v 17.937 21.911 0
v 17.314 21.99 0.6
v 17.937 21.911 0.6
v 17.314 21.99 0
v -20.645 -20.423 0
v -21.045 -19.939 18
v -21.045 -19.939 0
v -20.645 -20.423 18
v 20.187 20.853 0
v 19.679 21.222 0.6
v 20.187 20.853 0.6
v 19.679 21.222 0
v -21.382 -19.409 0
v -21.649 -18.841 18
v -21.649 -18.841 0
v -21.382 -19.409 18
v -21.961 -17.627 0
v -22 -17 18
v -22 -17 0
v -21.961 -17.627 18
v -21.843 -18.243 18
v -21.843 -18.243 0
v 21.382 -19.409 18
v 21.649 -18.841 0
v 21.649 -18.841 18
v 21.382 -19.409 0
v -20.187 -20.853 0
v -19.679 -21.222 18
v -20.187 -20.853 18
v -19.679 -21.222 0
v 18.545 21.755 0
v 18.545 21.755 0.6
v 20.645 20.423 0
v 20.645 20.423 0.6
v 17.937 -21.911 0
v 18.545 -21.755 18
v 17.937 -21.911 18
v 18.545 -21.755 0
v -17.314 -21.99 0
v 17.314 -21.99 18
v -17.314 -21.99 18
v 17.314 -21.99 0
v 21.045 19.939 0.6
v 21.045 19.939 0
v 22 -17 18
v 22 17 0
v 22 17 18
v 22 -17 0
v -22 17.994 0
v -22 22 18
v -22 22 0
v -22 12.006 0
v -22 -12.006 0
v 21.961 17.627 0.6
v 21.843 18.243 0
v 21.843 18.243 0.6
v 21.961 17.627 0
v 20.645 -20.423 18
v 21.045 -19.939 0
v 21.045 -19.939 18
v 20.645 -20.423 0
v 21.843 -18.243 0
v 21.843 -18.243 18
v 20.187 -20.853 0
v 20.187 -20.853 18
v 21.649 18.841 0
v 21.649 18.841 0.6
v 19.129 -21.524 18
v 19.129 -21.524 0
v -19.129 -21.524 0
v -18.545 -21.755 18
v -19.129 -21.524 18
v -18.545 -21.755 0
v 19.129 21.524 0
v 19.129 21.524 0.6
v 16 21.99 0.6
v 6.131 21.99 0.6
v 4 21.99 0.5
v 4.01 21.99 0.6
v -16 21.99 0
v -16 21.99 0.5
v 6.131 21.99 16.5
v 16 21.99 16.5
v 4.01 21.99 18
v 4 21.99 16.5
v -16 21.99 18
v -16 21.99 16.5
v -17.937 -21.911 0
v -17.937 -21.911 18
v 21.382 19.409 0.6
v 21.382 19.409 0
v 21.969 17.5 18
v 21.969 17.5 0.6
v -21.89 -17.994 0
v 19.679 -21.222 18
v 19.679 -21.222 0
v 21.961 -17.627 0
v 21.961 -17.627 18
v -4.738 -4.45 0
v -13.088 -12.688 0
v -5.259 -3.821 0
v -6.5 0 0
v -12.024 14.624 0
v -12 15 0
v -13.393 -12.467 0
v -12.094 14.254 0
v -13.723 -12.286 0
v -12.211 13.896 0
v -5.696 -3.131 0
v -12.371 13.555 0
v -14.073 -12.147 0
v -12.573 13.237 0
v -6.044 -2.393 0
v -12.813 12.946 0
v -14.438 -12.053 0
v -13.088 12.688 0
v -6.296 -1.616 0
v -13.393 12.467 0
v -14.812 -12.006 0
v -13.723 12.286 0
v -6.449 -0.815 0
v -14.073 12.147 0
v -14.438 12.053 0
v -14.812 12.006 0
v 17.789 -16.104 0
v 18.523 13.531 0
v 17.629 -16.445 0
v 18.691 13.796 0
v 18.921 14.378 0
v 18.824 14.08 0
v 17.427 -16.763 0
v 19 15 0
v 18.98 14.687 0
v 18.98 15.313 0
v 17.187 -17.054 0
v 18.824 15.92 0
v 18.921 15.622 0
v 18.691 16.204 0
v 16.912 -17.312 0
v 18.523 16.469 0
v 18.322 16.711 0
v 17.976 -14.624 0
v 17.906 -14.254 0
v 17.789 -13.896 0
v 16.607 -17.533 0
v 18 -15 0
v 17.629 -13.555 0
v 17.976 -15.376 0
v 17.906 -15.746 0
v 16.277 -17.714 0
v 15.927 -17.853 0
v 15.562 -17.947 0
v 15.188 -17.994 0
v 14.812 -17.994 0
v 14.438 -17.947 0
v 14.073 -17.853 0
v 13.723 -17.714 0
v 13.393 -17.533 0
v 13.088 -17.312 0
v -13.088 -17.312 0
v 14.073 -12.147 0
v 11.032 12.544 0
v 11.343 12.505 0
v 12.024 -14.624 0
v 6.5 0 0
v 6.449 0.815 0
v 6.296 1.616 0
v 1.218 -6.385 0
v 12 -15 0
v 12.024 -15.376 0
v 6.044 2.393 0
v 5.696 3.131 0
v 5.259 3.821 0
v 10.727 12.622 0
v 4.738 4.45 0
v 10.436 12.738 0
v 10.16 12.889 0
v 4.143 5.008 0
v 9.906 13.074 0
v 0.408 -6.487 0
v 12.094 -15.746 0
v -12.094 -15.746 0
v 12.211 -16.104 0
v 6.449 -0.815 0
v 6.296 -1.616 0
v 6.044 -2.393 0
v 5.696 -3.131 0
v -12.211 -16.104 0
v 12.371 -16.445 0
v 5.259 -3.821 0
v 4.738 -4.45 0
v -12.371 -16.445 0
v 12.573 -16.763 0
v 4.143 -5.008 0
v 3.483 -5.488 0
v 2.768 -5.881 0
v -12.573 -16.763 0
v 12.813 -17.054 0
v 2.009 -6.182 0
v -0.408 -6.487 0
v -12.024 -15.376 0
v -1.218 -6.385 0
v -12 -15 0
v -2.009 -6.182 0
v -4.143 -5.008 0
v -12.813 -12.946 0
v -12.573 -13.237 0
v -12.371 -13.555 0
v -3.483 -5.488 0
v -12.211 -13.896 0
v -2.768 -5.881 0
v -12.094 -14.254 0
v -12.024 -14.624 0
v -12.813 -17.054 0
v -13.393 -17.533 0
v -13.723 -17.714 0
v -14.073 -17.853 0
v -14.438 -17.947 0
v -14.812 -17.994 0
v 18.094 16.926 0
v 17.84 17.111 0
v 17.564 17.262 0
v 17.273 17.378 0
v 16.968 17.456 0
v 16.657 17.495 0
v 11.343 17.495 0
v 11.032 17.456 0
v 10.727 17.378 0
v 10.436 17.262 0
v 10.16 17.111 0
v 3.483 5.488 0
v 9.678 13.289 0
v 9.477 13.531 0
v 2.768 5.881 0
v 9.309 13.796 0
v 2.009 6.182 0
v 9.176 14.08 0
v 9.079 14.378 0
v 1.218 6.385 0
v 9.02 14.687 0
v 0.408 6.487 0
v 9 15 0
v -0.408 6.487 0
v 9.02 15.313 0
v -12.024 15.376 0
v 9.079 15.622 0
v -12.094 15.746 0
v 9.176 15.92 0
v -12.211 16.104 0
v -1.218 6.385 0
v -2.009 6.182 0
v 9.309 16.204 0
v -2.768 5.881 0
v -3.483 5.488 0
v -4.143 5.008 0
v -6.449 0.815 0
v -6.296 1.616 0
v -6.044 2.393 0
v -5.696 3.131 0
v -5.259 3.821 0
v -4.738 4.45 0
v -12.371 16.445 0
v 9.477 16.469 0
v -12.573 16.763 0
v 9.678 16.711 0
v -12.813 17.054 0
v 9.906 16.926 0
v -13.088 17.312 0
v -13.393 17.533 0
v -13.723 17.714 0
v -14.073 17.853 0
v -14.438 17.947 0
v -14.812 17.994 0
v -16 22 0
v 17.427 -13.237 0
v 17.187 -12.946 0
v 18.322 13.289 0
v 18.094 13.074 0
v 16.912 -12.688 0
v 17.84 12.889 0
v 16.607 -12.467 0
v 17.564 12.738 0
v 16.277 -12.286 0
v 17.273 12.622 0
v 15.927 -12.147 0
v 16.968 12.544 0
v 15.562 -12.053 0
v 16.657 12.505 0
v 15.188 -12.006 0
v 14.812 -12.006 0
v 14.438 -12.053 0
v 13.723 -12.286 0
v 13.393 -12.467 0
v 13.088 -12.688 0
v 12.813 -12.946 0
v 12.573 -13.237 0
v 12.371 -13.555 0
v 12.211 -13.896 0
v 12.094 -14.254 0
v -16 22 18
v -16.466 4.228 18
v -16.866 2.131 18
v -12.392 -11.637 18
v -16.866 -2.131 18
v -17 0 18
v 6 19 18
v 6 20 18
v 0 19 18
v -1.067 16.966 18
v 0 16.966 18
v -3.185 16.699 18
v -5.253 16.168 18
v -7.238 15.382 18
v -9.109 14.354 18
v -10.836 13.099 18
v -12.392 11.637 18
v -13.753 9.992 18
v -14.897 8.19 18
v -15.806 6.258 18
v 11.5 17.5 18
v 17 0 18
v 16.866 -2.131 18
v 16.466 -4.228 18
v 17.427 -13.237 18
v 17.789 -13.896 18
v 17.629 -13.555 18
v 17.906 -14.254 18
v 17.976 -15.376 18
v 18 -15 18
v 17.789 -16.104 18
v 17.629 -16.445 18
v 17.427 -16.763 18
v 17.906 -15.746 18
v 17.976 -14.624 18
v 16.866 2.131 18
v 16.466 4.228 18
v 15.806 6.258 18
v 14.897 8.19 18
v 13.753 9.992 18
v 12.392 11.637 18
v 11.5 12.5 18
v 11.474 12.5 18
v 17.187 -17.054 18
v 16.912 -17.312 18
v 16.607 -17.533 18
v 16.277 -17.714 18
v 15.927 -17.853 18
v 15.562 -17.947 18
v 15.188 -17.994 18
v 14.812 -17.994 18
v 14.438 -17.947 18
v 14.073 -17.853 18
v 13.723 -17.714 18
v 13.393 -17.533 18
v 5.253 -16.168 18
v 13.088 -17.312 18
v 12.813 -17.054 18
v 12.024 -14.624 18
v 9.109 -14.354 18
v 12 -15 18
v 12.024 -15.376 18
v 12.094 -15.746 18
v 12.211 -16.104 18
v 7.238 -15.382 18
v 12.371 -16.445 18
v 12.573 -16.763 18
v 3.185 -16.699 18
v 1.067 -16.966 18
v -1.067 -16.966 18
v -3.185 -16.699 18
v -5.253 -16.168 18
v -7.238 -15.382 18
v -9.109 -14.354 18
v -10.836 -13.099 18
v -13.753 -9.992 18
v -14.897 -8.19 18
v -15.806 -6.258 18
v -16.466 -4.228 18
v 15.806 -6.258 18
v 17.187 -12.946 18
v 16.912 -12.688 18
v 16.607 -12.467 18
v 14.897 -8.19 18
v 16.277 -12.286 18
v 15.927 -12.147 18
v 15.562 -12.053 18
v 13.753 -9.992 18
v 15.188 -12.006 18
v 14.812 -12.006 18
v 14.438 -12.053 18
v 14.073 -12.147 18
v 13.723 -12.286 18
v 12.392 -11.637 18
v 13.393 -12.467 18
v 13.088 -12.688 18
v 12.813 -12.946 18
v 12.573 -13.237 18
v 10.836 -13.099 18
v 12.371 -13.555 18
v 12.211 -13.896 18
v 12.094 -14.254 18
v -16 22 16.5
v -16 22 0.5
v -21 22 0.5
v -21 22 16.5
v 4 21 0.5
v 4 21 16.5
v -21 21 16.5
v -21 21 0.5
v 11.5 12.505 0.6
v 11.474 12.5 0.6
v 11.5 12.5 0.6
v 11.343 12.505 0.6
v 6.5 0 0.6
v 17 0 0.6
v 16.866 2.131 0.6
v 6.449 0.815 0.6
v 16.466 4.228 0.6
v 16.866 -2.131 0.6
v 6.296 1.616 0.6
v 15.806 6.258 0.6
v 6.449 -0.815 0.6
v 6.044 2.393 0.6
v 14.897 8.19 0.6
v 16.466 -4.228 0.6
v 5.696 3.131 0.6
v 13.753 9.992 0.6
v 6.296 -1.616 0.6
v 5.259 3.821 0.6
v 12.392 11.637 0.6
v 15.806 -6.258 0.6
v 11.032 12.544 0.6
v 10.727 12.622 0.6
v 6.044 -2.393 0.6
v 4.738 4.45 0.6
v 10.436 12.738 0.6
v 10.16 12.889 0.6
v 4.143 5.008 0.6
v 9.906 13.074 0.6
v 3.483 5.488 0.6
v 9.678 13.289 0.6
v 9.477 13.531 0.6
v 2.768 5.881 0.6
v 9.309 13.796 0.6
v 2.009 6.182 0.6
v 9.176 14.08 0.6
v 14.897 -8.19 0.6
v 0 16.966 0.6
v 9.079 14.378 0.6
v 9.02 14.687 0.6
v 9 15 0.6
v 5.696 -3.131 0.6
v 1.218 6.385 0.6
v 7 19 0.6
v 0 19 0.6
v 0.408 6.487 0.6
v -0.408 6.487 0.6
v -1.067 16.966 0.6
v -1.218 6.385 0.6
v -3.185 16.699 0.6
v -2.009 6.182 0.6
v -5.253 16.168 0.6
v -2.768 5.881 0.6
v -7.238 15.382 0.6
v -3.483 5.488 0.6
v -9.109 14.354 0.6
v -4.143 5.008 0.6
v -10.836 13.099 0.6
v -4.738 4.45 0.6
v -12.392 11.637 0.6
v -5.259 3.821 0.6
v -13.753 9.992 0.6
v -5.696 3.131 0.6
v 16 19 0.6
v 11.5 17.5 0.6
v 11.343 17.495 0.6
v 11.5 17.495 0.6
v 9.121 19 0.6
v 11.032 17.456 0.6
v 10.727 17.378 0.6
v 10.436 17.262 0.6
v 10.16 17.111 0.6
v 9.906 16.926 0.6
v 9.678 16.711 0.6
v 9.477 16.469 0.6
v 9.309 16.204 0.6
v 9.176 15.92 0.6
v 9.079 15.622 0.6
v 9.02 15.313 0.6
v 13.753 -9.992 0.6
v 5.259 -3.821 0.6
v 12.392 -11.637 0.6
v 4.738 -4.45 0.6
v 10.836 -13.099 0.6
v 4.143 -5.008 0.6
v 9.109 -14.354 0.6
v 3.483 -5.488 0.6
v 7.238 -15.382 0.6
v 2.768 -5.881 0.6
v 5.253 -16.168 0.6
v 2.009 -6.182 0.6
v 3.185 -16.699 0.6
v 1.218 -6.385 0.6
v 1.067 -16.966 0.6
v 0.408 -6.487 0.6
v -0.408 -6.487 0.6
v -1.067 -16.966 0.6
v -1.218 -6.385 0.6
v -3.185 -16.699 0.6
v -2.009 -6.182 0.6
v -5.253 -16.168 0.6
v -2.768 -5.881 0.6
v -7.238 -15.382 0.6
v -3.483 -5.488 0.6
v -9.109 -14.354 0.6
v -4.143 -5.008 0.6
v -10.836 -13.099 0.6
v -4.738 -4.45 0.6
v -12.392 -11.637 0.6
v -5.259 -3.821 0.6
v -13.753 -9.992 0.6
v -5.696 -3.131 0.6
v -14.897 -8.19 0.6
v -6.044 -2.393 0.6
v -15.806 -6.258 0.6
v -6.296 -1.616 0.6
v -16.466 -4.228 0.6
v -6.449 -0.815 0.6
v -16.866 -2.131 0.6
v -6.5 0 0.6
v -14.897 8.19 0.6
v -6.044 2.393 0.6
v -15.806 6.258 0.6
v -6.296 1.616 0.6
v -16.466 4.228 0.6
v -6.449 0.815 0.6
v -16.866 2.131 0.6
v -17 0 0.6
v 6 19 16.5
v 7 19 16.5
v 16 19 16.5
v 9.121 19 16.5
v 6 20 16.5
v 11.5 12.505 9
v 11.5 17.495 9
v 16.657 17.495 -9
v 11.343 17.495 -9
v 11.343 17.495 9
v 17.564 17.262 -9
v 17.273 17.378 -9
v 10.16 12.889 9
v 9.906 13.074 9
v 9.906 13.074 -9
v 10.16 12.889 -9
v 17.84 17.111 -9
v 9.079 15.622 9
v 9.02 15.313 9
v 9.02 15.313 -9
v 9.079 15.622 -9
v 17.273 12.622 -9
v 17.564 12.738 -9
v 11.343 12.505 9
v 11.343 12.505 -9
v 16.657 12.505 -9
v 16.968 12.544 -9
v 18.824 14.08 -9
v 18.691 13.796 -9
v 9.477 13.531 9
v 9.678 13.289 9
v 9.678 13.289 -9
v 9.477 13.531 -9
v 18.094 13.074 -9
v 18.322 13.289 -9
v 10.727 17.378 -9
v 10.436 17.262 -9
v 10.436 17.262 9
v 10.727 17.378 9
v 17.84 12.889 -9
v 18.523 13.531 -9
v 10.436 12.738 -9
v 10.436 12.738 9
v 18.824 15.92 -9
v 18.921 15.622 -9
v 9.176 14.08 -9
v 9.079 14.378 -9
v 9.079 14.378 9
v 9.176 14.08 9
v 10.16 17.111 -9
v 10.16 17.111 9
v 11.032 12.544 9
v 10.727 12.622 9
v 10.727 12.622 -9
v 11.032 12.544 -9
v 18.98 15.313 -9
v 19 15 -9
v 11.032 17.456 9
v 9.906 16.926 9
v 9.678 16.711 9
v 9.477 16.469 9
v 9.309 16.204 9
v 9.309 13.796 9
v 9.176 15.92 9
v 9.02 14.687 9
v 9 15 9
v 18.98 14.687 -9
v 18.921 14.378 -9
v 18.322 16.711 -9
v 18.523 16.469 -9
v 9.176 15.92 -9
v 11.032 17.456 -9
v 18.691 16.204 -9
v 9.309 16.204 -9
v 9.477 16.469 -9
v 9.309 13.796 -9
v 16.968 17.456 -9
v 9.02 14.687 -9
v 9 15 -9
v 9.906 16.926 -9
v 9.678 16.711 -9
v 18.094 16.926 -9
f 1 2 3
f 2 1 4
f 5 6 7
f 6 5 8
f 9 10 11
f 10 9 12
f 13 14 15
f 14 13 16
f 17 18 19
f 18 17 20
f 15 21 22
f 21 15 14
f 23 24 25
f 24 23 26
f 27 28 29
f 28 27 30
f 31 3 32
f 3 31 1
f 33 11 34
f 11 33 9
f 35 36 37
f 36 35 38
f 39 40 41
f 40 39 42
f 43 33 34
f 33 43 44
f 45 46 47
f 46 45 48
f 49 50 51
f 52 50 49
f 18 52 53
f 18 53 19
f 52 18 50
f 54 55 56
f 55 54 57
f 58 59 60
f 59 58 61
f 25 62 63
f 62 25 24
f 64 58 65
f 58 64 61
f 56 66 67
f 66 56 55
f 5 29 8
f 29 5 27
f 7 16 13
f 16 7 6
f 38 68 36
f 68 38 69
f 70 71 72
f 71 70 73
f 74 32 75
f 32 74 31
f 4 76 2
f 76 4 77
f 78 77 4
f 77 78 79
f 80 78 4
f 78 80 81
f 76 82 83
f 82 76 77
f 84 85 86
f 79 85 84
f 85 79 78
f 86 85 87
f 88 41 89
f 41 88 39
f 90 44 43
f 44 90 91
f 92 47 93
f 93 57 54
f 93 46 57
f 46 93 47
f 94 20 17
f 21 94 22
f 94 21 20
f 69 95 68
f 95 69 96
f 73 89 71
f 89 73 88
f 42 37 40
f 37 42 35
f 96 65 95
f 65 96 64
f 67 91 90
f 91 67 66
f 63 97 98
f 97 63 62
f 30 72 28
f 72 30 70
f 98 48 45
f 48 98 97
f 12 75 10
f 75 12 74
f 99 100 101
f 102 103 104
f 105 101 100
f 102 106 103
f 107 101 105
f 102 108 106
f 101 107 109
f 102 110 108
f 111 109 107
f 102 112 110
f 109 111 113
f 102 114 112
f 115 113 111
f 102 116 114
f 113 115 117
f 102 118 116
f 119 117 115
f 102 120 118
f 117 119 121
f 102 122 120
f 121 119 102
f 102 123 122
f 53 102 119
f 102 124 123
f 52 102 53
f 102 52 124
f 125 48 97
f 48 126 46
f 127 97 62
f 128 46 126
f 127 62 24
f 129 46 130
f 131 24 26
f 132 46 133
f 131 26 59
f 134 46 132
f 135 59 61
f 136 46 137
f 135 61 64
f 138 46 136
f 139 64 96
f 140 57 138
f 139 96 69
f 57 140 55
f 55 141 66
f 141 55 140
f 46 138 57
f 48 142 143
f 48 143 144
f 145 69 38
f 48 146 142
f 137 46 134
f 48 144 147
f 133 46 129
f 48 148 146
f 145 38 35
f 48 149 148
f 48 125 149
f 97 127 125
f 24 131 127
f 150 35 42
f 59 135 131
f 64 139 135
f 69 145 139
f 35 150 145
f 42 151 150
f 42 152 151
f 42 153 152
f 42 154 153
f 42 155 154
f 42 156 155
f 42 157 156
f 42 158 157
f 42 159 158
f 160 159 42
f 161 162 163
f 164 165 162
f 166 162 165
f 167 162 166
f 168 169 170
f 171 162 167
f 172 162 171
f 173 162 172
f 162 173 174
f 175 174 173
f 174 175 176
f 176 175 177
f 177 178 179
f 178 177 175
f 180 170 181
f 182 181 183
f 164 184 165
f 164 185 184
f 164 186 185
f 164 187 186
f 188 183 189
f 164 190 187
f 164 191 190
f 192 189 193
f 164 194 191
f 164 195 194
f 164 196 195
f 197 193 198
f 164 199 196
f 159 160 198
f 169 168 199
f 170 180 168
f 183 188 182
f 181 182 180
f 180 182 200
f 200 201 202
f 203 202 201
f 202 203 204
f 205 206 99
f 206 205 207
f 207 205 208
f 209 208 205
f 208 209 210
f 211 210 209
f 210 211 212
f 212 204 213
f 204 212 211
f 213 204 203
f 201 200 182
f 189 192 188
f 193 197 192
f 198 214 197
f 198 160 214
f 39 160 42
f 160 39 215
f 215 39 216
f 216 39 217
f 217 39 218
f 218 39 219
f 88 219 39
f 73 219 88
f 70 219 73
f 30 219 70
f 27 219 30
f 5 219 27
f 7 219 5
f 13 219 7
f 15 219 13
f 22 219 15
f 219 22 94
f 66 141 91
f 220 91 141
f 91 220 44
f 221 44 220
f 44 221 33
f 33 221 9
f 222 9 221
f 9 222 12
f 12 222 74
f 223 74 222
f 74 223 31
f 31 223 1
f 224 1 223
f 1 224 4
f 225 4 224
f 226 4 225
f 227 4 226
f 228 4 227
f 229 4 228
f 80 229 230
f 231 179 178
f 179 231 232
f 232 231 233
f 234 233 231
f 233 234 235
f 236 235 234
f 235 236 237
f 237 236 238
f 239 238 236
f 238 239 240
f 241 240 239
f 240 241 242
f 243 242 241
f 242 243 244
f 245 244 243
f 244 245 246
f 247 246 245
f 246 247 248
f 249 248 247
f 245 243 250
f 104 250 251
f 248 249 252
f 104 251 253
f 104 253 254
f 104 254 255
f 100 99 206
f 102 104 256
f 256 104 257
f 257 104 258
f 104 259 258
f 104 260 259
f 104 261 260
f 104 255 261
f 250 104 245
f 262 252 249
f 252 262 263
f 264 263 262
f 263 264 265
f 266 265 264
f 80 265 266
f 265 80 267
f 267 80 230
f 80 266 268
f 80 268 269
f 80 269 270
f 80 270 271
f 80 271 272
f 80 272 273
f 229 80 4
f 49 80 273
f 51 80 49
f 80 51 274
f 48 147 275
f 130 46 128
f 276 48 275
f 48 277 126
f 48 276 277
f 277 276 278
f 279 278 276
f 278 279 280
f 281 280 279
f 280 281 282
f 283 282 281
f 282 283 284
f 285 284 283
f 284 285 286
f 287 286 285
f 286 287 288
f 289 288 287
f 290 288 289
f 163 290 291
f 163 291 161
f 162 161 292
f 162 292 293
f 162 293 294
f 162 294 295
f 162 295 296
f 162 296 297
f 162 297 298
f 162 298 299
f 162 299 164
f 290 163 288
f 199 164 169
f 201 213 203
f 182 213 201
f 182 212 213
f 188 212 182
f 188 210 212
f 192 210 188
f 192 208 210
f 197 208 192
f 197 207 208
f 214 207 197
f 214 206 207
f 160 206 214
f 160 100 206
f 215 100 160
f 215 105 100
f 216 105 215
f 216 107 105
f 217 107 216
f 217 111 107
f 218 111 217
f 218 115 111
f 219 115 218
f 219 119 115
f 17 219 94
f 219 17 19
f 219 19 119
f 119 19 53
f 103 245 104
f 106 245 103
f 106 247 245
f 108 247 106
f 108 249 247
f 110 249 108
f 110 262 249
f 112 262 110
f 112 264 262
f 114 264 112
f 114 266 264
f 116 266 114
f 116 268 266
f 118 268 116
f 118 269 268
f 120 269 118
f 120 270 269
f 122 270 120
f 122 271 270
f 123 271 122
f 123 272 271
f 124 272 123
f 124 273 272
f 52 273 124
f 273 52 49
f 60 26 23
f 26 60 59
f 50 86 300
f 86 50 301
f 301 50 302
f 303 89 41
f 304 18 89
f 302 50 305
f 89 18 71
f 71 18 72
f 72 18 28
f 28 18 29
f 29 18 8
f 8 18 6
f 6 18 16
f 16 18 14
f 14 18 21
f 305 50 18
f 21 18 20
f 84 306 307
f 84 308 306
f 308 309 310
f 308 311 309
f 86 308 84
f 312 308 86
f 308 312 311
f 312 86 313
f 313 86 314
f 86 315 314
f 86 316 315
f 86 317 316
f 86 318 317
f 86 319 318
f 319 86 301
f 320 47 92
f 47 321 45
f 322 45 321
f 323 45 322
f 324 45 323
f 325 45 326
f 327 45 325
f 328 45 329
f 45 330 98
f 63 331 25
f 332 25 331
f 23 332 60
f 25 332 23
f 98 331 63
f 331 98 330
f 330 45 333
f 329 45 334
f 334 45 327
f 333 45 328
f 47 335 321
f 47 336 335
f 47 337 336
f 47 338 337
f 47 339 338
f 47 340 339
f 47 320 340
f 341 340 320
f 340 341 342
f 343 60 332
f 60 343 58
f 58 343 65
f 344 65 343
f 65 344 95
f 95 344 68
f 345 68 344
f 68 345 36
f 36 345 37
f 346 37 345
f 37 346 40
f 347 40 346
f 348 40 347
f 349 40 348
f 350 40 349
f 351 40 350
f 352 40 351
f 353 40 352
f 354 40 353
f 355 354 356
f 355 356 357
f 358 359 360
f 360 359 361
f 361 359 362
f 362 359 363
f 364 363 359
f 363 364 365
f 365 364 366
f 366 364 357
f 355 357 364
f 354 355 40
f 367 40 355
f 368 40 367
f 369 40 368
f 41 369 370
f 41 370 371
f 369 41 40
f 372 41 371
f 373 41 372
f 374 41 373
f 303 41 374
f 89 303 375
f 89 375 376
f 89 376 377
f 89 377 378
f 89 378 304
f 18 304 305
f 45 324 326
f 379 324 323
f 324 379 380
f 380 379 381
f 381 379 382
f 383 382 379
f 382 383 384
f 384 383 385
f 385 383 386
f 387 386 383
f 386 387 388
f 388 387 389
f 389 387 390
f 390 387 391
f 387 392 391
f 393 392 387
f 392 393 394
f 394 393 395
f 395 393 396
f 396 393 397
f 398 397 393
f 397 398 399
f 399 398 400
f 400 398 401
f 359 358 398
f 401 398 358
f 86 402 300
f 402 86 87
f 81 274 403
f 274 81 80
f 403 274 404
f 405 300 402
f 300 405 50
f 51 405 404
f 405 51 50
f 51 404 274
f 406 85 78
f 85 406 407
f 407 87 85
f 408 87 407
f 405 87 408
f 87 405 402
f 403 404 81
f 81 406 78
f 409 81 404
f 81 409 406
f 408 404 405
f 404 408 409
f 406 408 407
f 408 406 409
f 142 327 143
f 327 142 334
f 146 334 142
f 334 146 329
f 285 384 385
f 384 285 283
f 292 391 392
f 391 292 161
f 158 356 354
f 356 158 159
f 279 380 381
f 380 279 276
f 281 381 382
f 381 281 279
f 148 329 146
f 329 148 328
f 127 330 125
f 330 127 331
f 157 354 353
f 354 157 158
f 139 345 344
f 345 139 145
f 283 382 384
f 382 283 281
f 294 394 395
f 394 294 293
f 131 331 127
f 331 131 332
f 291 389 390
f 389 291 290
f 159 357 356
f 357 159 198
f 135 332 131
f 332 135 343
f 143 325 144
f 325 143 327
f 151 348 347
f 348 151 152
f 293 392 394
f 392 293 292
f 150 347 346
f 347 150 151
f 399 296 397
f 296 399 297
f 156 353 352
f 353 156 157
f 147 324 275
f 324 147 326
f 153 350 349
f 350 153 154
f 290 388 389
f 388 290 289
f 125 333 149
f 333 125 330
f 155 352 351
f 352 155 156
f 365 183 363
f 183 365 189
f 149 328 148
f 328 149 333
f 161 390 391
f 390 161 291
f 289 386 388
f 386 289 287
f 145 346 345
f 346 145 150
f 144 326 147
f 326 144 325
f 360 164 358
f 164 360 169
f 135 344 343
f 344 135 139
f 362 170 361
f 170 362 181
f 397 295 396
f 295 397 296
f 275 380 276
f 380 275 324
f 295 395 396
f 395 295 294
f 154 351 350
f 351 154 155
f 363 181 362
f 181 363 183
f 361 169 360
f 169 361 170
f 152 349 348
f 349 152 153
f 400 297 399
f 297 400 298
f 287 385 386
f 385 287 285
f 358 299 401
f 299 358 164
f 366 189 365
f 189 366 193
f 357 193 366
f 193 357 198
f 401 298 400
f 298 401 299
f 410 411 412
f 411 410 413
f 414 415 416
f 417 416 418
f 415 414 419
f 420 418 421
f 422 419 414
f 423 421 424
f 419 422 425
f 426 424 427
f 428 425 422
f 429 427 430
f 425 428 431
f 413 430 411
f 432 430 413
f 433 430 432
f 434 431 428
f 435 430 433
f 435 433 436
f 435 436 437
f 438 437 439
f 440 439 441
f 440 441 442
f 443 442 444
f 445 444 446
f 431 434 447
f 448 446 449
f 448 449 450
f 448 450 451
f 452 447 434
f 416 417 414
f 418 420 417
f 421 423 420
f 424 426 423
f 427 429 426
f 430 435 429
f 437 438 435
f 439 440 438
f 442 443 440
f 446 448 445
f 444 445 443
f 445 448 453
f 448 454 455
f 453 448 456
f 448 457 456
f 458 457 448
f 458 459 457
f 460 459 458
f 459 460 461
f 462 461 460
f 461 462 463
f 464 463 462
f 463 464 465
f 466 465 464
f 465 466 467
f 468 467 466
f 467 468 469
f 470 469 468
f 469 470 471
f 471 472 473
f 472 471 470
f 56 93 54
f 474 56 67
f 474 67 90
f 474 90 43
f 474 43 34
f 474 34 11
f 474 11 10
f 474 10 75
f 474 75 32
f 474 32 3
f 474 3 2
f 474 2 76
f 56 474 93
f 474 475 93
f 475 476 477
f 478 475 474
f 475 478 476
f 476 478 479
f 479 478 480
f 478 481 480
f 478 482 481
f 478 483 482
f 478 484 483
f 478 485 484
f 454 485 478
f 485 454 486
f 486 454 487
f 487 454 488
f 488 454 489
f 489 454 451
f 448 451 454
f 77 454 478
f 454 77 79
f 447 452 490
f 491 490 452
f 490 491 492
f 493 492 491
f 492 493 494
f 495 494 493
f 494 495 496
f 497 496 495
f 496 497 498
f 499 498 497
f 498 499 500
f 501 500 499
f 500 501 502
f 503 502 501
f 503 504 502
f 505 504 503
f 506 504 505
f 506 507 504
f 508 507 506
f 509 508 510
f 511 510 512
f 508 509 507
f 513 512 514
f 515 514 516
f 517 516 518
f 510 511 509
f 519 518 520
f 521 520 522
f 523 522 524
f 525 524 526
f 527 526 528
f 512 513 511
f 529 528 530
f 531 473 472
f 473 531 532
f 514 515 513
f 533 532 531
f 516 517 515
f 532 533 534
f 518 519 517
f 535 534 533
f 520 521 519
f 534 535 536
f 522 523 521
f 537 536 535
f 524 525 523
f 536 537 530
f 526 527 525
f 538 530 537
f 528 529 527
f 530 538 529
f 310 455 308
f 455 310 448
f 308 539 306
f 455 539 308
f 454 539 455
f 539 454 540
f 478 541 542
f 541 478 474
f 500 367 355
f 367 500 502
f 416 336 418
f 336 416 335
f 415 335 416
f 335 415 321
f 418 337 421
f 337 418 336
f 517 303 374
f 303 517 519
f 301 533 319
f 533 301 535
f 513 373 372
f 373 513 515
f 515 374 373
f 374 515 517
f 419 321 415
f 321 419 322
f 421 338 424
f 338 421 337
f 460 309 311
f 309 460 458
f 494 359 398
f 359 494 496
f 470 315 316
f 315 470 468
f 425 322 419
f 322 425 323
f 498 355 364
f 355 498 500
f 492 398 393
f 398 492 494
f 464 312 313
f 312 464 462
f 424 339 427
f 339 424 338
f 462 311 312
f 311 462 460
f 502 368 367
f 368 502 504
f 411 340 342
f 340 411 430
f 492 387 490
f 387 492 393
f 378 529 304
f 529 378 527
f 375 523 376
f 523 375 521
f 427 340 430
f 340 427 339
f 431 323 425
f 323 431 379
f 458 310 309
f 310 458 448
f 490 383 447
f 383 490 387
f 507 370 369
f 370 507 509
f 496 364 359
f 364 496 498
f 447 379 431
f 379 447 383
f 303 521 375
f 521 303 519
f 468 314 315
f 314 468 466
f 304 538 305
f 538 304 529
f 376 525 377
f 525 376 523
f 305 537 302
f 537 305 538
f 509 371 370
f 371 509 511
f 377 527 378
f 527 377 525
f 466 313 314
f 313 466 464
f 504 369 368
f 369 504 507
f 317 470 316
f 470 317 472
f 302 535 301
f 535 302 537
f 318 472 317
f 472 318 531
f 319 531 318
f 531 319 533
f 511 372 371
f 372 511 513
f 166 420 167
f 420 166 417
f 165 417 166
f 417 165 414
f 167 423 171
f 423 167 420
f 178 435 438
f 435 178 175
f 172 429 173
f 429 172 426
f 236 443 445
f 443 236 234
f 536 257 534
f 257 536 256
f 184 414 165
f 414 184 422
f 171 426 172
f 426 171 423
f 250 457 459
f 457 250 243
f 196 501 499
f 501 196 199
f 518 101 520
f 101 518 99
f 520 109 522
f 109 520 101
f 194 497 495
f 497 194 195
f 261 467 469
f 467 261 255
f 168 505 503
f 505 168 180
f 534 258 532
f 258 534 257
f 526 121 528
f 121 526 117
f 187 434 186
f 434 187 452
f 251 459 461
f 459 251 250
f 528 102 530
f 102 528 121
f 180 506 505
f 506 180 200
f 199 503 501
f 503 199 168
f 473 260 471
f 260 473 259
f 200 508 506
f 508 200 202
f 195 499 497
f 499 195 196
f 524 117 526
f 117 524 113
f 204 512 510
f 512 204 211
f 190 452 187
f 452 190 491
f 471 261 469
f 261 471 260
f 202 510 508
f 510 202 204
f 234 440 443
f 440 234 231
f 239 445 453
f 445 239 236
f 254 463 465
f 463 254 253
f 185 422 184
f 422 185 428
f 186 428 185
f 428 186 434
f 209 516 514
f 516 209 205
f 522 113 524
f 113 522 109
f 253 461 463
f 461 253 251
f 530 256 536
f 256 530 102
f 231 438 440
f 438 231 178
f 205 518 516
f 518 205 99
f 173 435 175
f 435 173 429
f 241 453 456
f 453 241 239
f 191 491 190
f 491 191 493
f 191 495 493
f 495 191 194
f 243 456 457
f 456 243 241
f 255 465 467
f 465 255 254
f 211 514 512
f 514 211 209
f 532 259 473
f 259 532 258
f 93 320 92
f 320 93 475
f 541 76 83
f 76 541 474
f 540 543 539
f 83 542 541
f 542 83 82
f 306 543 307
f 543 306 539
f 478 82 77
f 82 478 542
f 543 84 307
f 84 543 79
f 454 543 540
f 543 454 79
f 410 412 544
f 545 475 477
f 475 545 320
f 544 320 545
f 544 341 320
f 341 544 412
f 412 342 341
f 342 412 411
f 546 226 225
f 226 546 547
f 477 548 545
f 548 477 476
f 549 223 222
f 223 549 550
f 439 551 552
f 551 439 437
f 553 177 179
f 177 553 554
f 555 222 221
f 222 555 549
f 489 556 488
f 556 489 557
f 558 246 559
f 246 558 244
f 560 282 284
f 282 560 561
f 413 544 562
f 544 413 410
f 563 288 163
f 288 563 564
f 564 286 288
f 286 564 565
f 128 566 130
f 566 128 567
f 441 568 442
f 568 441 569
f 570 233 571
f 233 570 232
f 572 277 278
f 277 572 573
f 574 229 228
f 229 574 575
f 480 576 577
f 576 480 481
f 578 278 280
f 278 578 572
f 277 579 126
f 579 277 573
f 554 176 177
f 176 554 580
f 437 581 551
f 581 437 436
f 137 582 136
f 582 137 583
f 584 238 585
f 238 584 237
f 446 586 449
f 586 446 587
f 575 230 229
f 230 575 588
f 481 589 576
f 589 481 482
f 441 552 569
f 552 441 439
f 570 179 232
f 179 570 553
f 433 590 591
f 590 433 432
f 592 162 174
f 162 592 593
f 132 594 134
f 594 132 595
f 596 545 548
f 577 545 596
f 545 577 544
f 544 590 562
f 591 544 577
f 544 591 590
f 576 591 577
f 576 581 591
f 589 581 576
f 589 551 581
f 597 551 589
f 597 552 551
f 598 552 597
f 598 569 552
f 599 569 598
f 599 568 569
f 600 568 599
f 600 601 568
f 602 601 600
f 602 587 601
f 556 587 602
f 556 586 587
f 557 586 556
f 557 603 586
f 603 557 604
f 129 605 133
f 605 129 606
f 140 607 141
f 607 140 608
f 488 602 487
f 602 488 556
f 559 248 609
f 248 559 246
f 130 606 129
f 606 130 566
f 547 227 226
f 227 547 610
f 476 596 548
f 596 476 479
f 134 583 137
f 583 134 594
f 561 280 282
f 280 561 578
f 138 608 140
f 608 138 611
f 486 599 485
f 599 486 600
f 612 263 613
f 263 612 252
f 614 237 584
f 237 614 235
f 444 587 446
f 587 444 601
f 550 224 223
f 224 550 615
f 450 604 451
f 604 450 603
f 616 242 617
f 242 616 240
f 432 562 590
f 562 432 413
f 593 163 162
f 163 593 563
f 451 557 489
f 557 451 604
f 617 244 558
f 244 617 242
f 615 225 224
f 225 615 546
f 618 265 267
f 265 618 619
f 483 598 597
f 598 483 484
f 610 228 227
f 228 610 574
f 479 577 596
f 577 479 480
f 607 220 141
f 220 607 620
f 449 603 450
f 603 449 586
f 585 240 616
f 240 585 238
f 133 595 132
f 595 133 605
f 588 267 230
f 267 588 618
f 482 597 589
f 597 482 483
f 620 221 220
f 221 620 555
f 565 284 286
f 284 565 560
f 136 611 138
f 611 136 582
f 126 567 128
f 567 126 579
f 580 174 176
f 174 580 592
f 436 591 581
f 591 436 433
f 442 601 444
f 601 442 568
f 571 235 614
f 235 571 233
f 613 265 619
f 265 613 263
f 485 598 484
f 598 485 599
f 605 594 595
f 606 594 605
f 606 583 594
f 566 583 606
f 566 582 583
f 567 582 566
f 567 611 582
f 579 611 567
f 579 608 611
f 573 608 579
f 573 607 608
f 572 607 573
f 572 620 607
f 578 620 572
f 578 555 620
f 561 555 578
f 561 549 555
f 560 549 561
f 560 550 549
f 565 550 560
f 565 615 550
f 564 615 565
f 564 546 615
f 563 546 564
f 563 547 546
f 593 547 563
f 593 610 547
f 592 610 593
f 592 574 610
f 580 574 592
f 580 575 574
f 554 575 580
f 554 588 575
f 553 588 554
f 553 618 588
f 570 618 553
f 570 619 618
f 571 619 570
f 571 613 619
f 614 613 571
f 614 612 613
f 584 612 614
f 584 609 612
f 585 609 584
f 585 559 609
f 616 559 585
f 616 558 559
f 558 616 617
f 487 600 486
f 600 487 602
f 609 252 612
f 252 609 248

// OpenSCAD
$fn = 50;


union() {
	difference() {
		union() {
			hull() {
				translate(v = [-17.0000000000, 17.0000000000, 0]) {
					cylinder(h = 18, r = 5);
				}
				translate(v = [17.0000000000, 17.0000000000, 0]) {
					cylinder(h = 18, r = 5);
				}
				translate(v = [-17.0000000000, -17.0000000000, 0]) {
					cylinder(h = 18, r = 5);
				}
				translate(v = [17.0000000000, -17.0000000000, 0]) {
					cylinder(h = 18, r = 5);
				}
			}
			translate(v = [-22.0000000000, 16.0000000000, 0]) {
				cube(size = [6, 6, 18]);
			}
		}
		union() {
			translate(v = [-22.5000000000, -15.0000000000, -250.0000000000]) {
				rotate(a = [0, 0, 0]) {
					difference() {
						union() {
							hull() {
								translate(v = [7.5000000000, 0, 0]) {
									cylinder(h = 250, r = 3.0000000000, r1 = 3.0000000000, r2 = 3.0000000000);
								}
								translate(v = [-7.5000000000, 0, 0]) {
									cylinder(h = 250, r = 3.0000000000, r1 = 3.0000000000, r2 = 3.0000000000);
								}
							}
						}
						union();
					}
				}
			}
			translate(v = [-22.5000000000, 15.0000000000, -250.0000000000]) {
				rotate(a = [0, 0, 0]) {
					difference() {
						union() {
							hull() {
								translate(v = [7.5000000000, 0, 0]) {
									cylinder(h = 250, r = 3.0000000000, r1 = 3.0000000000, r2 = 3.0000000000);
								}
								translate(v = [-7.5000000000, 0, 0]) {
									cylinder(h = 250, r = 3.0000000000, r1 = 3.0000000000, r2 = 3.0000000000);
								}
							}
						}
						union();
					}
				}
			}
			translate(v = [-21.0000000000, 21.0000000000, 0.5000000000]) {
				cube(size = [25, 1, 16]);
			}
			translate(v = [15.0000000000, -15.0000000000, 0]) {
				cylinder(h = 100, r = 3.0000000000);
			}
			translate(v = [0.0000000000, 11.0000000000, 0.6000000000]) {
				cube(size = [11, 8, 20.4000000000]);
			}
			translate(v = [0, 0, 0.6000000000]) {
				cylinder(h = 20.4000000000, r = 17.0000000000);
			}
			translate(v = [0, 0, -9.0000000000]) {
				cylinder(h = 18, r = 6.5000000000);
			}
			translate(v = [0.0000000000, 17.5000000000, 0.6000000000]) {
				cube(size = [22.0000000000, 1.5000000000, 20.4000000000]);
			}
			translate(v = [16.0000000000, 17.5000000000, 0.6000000000]) {
				cube(size = [6, 4.5000000000, 20.4000000000]);
			}
			translate(v = [6.0000000000, 17.5000000000, 16.5000000000]) {
				cube(size = [16, 4.5000000000, 1.5000000000]);
			}
			translate(v = [3.2500000000, 22.7500000000, 0.6000000000]) {
				rotate(a = [0, 0, -45]) {
					cube(size = [7.5000000000, 1.5000000000, 20.4000000000]);
				}
			}
			translate(v = [2.5000000000, 12.5000000000, 0.6000000000]) {
				cube(size = [9.0000000000, 5, 17.4000000000]);
			}
		}
	}
	union() {
		translate(v = [14, 15.0000000000, -9.0000000000]) {
			rotate(a = [0, 0, 0]) {
				difference() {
					union() {
						#hull() {
							#translate(v = [2.5000000000, 0, 0]) {
								cylinder(h = 18, r = 2.5000000000, r1 = 2.5000000000, r2 = 2.5000000000);
							}
							#translate(v = [-2.5000000000, 0, 0]) {
								cylinder(h = 18, r = 2.5000000000, r1 = 2.5000000000, r2 = 2.5000000000);
							}
						}
					}
					union();
				}
			}
		}
	}
}
